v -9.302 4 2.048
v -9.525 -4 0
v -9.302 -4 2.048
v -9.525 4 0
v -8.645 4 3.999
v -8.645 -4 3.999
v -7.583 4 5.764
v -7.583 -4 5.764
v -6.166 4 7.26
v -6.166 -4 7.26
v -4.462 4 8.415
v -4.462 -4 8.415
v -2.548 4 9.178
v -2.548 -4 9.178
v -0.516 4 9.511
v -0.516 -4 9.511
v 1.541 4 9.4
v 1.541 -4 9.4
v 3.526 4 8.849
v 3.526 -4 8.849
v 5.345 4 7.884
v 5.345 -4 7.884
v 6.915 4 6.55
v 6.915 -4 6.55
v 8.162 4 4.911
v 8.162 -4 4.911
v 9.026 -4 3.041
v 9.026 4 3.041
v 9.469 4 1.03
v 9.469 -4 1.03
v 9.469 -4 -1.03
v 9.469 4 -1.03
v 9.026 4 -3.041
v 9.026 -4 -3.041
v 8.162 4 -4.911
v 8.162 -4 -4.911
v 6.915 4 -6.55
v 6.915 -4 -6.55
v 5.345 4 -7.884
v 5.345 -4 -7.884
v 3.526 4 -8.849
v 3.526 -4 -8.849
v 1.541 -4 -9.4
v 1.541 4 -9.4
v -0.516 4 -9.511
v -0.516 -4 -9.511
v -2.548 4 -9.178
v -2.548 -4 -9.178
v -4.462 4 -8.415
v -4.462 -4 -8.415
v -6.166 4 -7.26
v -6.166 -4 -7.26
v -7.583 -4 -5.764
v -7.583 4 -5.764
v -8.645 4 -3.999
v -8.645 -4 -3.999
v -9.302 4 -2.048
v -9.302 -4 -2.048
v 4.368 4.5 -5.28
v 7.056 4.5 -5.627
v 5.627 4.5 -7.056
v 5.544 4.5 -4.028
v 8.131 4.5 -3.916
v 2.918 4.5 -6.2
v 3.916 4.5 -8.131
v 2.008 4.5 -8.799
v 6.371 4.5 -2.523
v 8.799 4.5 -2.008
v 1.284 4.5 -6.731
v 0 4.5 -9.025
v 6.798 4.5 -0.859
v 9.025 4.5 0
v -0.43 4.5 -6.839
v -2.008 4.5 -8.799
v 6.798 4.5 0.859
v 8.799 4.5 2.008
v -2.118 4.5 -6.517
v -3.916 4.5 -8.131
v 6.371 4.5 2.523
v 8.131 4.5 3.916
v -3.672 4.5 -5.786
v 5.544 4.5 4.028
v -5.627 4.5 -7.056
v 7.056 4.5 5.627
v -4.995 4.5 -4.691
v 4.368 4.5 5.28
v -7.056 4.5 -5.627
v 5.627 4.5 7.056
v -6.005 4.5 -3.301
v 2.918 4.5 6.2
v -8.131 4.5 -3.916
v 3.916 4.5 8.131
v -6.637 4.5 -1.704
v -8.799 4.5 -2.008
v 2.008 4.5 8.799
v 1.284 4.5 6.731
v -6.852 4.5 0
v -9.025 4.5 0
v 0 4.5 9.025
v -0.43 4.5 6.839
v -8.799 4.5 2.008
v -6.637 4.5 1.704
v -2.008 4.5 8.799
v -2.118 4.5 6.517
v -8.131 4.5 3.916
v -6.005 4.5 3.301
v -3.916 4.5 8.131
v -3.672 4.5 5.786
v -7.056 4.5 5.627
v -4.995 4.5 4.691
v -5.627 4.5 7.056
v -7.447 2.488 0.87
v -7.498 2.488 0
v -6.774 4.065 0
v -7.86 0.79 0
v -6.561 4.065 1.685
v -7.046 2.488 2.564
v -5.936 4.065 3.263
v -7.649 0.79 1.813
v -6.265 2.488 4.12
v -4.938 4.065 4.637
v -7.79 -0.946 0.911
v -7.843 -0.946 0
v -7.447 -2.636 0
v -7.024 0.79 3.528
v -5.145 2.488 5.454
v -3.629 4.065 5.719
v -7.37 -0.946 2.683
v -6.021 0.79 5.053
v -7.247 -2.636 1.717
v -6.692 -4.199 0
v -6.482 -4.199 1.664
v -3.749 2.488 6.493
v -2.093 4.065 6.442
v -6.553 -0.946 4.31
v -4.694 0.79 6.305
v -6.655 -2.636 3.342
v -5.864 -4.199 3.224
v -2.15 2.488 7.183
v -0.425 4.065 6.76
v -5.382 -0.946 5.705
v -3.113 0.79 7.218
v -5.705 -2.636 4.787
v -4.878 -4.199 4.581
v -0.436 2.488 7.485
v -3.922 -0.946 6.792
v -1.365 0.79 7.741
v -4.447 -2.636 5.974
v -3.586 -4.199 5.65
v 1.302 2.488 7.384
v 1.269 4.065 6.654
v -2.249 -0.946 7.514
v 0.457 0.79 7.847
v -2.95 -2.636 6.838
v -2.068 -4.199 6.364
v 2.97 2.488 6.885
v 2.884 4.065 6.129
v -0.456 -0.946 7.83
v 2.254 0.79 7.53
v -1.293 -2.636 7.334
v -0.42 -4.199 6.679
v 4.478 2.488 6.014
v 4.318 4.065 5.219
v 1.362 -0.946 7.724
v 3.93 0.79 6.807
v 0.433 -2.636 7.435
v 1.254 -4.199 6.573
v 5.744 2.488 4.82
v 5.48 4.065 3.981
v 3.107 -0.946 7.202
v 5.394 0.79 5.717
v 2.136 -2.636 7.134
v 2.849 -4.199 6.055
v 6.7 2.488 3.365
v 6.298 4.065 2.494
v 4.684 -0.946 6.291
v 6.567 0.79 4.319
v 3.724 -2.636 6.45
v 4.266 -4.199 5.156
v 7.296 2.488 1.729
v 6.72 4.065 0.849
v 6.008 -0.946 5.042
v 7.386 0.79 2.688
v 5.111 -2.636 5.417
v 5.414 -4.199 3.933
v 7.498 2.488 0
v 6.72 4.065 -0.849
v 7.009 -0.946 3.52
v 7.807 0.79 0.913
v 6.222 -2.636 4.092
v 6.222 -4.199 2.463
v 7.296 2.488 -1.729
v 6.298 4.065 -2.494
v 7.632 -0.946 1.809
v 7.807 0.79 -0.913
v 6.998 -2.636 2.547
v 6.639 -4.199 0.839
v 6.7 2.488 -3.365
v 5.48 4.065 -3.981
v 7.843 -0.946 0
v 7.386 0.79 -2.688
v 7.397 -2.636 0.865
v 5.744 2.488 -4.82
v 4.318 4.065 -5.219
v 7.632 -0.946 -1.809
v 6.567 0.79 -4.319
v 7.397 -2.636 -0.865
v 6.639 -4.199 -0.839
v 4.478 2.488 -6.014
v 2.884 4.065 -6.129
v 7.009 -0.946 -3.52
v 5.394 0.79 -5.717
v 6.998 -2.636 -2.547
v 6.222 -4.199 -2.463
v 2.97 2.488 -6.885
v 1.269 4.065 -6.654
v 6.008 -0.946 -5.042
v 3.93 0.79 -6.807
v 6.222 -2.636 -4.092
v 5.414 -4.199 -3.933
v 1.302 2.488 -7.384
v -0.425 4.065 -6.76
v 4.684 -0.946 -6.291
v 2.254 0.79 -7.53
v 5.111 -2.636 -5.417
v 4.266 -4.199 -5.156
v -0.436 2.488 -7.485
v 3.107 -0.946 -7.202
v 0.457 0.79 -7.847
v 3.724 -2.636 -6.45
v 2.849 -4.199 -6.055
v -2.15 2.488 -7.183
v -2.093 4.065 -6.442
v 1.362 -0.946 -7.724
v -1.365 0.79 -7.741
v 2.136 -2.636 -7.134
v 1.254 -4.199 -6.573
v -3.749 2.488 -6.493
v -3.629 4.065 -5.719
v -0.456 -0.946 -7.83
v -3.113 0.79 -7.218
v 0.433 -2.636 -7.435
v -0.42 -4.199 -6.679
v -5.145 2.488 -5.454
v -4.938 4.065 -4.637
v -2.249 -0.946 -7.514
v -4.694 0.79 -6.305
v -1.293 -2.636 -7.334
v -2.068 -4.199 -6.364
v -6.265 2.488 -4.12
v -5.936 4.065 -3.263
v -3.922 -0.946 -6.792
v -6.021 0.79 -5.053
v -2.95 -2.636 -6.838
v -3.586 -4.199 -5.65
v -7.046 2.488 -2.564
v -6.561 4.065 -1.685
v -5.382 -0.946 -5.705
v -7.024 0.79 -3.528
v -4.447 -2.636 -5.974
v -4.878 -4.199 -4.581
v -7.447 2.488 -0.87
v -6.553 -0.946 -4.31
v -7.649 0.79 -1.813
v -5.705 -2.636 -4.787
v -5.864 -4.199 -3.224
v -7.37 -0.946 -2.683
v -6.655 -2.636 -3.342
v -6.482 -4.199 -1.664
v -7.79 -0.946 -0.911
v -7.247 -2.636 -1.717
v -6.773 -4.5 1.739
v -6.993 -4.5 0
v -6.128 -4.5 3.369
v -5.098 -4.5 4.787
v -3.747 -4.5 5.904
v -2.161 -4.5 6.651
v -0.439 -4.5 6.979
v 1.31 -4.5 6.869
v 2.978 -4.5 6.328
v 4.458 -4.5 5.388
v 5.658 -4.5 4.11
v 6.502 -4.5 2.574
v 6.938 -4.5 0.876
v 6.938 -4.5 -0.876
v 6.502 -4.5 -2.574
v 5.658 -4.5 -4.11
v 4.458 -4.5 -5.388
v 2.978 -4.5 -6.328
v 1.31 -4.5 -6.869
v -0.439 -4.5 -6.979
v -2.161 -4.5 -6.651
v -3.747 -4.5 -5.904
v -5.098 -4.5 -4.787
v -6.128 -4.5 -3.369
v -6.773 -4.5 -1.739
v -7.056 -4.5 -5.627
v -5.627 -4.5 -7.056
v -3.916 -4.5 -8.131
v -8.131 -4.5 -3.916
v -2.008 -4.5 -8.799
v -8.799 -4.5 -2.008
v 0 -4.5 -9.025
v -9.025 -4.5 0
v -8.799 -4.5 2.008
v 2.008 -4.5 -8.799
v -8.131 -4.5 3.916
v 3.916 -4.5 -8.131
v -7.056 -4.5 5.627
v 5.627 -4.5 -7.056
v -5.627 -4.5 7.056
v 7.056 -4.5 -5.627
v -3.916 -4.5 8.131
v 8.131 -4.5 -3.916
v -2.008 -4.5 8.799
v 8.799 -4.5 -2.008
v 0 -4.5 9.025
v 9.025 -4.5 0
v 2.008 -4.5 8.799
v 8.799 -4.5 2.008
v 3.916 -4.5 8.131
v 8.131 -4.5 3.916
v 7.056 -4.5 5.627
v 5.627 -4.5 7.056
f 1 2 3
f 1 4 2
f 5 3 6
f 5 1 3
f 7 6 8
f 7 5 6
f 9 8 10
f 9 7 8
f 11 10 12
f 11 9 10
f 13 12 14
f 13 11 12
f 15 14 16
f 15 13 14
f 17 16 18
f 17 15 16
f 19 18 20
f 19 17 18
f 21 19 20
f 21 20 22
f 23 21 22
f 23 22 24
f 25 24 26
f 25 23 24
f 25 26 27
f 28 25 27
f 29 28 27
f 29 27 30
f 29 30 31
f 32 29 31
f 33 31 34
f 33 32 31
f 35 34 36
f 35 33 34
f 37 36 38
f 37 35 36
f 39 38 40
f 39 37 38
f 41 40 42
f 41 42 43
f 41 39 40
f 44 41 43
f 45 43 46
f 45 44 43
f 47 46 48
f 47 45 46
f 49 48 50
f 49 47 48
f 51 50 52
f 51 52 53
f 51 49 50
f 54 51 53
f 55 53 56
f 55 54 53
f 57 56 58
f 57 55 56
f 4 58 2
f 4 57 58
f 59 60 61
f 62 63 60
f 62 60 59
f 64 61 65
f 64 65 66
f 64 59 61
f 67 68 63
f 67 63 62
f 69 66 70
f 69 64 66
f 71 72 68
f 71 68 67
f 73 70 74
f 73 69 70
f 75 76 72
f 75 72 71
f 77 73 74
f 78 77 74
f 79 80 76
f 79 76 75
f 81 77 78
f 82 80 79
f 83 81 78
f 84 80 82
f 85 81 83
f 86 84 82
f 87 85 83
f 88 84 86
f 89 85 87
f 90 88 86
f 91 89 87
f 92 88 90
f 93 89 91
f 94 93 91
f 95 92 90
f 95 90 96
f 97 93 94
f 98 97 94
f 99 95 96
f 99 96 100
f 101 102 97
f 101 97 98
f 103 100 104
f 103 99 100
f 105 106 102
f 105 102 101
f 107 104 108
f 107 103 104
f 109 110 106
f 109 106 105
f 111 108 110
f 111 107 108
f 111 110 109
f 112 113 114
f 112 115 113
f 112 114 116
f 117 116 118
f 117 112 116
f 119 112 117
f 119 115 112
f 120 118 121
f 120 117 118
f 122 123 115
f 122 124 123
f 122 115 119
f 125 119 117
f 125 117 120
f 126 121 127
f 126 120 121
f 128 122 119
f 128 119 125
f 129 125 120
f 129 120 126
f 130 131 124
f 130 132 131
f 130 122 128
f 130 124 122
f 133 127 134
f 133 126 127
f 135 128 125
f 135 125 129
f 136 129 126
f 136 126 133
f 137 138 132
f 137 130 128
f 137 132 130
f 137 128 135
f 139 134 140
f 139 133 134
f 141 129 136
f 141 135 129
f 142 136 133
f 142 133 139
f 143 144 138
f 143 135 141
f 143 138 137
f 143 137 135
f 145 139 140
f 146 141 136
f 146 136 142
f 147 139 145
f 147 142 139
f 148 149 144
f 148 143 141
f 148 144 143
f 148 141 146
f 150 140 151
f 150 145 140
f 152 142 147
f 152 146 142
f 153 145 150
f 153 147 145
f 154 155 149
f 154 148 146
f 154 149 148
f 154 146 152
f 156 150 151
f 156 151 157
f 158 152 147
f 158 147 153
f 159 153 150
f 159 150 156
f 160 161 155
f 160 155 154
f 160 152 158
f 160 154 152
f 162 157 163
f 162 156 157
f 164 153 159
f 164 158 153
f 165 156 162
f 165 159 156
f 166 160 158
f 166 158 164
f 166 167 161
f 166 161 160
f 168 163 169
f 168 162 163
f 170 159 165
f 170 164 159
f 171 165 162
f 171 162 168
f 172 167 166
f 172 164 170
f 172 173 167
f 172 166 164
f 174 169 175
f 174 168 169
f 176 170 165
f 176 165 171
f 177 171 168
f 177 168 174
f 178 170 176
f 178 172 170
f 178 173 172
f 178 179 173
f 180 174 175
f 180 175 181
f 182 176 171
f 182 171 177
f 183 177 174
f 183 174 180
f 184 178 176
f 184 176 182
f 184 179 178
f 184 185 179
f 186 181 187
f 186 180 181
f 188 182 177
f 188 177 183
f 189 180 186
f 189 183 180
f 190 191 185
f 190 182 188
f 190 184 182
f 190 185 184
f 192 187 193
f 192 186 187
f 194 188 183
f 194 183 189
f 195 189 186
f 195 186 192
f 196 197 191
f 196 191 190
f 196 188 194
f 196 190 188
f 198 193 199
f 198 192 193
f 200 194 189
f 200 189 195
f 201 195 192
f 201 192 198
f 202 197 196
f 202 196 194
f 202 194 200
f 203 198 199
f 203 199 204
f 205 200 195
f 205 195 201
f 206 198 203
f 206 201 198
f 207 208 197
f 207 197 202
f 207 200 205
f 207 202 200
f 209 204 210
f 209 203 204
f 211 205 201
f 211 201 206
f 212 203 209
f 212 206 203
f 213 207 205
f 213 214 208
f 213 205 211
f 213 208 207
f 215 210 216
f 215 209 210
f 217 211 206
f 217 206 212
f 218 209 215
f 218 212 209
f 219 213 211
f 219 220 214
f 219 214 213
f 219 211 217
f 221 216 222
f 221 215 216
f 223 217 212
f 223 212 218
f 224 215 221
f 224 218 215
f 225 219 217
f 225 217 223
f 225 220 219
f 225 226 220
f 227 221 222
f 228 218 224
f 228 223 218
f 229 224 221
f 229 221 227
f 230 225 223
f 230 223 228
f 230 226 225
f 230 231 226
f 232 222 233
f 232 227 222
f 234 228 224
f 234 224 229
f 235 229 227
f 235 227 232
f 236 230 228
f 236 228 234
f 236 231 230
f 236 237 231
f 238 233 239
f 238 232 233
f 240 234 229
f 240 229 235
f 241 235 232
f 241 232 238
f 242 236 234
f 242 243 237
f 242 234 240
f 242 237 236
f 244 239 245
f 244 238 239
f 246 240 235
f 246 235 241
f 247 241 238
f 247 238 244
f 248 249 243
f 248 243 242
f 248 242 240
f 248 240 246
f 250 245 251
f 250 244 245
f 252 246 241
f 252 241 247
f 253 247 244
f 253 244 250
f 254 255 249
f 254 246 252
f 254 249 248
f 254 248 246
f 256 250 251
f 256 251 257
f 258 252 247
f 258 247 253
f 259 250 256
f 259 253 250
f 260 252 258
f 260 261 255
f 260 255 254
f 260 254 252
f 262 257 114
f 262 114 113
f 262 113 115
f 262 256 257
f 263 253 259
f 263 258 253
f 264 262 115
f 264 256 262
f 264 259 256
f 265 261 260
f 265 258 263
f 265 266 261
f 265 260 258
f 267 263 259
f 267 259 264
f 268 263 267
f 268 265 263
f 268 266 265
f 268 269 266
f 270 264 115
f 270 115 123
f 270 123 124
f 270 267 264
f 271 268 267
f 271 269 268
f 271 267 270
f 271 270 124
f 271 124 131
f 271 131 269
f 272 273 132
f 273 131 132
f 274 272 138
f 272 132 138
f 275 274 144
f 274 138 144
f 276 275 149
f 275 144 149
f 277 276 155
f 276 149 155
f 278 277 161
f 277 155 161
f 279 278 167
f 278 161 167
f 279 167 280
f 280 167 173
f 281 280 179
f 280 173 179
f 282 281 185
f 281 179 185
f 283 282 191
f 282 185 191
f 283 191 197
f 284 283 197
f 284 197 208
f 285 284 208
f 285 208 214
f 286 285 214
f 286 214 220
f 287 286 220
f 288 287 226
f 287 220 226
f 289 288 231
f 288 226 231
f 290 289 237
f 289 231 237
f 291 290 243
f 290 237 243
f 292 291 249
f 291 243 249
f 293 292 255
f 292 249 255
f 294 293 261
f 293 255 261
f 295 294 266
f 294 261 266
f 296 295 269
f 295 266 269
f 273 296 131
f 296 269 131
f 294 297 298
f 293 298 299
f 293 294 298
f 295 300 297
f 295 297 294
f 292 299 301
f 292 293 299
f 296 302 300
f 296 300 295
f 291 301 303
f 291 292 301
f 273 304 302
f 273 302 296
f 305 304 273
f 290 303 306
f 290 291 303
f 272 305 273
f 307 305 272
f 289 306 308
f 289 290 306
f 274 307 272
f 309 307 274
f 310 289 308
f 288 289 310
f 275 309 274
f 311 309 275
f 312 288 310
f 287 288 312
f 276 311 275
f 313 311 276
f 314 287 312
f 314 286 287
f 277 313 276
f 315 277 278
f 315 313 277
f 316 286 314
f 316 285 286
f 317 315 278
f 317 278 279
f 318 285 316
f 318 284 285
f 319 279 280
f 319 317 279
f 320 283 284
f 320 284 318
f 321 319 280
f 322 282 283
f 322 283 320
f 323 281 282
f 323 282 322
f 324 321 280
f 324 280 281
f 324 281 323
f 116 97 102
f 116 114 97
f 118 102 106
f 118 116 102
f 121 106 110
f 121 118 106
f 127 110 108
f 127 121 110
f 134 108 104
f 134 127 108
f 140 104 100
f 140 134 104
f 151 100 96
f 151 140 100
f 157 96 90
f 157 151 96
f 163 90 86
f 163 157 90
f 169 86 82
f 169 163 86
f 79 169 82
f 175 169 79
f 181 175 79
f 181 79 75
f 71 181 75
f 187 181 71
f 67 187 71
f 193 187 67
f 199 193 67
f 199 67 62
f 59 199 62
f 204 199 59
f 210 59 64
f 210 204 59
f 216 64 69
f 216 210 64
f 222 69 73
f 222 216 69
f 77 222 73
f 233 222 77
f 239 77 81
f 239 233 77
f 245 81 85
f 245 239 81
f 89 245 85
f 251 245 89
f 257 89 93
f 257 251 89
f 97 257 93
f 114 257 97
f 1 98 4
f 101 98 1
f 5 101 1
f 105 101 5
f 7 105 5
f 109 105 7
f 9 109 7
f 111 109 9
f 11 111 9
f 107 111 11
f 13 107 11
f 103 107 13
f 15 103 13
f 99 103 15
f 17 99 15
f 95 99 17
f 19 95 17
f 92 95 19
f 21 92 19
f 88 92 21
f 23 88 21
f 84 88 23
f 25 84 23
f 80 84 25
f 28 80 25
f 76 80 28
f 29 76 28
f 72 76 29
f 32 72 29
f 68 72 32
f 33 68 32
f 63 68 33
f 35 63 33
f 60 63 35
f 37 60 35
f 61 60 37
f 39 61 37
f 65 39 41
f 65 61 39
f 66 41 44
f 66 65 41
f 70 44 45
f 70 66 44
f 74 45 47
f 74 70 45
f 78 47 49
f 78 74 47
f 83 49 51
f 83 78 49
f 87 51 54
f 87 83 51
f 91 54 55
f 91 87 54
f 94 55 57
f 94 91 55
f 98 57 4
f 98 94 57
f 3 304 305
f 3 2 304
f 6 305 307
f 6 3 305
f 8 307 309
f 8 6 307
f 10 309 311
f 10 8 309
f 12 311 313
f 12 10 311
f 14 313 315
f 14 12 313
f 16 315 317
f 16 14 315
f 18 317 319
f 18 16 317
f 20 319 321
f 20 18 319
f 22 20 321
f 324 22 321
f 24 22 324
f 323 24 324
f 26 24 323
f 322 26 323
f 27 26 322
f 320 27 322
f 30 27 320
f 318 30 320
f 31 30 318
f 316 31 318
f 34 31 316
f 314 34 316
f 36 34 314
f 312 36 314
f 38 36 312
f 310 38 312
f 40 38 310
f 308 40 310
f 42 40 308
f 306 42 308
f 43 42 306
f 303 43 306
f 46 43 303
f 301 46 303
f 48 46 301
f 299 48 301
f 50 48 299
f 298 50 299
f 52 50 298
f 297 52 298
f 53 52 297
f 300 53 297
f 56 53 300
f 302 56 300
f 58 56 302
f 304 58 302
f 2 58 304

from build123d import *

# Parameters (mm, degrees)
CHAMFER1_SIZE   = 0.359317173
CHAMFER1_SIZE_2 = 0.5


with BuildPart() as part:
    # Sketch2 → Revolve1 (revolve)
    with BuildSketch(Plane.XY):
        with BuildLine():
            Line((-9.525, -4.5), (-9.525, 4.5))
            Line((-9.525, 4.5), (-6.493073232, 4.5))
            ThreePointArc((-6.493073232, 4.5), (-7.9, 0), (-6.493073232, -4.5))
            Line((-6.493073232, -4.5), (-9.525, -4.5))
        make_face()
    revolve(axis=Axis((0, -4.5, 0), (0, 1, 0)))

    # Chamfer1
    # the kernel refuses this chamfer: 0.5, 0.359317173 mm, written as the material it takes off along each edge
    with BuildSketch(Plane(origin=(0, 4.5, 0), x_dir=(-1, 0, 0), z_dir=(0, 0, -1))) as chamfer1_piece_1:
        with BuildLine():
            Line((6.493073232 + CHAMFER1_SIZE, 0), (6.773611969, -0.434513449))
            ThreePointArc((6.773611969, -0.434513449), (6.640861095, -0.221102487), (6.493073232, 0))
            Line((6.493073232, 0), (6.493073232 + CHAMFER1_SIZE, 0))
        make_face()
    revolve(axis=Axis((0, 4.5, 0), (0, 1, 0)), mode=Mode.SUBTRACT)
    with BuildSketch(Plane(origin=(0, 4.5, 0), x_dir=(-1, 0, 0), z_dir=(0, 0, -1))) as chamfer1_piece_2:
        Polygon((9.525, -CHAMFER1_SIZE_2), (9.525 - CHAMFER1_SIZE_2, 0), (9.525, 0), align=None)
    revolve(axis=Axis((0, 4.5, 0), (0, 1, 0)), mode=Mode.SUBTRACT)
    with BuildSketch(Plane(origin=(0, -4.5, 0), x_dir=(-1, 0, 0), z_dir=(0, 0, -1))) as chamfer1_piece_3:
        Polygon((9.525 - CHAMFER1_SIZE_2, 0), (9.525, CHAMFER1_SIZE_2), (9.525, 0), align=None)
    revolve(axis=Axis((0, -4.5, 0), (0, 1, 0)), mode=Mode.SUBTRACT)
    with BuildSketch(Plane(origin=(0, -4.5, 0), x_dir=(-1, 0, 0), z_dir=(0, 0, -1))) as chamfer1_piece_4:
        with BuildLine():
            Line((6.493073232 + CHAMFER1_SIZE_2, 0), (6.691823244, 0.301249988))
            ThreePointArc((6.691823244, 0.301249988), (6.595276141, 0.151168821), (6.493073232, 0))
            Line((6.493073232, 0), (6.493073232 + CHAMFER1_SIZE_2, 0))
        make_face()
    revolve(axis=Axis((0, -4.5, 0), (0, 1, 0)), mode=Mode.SUBTRACT)


solid = part.part
